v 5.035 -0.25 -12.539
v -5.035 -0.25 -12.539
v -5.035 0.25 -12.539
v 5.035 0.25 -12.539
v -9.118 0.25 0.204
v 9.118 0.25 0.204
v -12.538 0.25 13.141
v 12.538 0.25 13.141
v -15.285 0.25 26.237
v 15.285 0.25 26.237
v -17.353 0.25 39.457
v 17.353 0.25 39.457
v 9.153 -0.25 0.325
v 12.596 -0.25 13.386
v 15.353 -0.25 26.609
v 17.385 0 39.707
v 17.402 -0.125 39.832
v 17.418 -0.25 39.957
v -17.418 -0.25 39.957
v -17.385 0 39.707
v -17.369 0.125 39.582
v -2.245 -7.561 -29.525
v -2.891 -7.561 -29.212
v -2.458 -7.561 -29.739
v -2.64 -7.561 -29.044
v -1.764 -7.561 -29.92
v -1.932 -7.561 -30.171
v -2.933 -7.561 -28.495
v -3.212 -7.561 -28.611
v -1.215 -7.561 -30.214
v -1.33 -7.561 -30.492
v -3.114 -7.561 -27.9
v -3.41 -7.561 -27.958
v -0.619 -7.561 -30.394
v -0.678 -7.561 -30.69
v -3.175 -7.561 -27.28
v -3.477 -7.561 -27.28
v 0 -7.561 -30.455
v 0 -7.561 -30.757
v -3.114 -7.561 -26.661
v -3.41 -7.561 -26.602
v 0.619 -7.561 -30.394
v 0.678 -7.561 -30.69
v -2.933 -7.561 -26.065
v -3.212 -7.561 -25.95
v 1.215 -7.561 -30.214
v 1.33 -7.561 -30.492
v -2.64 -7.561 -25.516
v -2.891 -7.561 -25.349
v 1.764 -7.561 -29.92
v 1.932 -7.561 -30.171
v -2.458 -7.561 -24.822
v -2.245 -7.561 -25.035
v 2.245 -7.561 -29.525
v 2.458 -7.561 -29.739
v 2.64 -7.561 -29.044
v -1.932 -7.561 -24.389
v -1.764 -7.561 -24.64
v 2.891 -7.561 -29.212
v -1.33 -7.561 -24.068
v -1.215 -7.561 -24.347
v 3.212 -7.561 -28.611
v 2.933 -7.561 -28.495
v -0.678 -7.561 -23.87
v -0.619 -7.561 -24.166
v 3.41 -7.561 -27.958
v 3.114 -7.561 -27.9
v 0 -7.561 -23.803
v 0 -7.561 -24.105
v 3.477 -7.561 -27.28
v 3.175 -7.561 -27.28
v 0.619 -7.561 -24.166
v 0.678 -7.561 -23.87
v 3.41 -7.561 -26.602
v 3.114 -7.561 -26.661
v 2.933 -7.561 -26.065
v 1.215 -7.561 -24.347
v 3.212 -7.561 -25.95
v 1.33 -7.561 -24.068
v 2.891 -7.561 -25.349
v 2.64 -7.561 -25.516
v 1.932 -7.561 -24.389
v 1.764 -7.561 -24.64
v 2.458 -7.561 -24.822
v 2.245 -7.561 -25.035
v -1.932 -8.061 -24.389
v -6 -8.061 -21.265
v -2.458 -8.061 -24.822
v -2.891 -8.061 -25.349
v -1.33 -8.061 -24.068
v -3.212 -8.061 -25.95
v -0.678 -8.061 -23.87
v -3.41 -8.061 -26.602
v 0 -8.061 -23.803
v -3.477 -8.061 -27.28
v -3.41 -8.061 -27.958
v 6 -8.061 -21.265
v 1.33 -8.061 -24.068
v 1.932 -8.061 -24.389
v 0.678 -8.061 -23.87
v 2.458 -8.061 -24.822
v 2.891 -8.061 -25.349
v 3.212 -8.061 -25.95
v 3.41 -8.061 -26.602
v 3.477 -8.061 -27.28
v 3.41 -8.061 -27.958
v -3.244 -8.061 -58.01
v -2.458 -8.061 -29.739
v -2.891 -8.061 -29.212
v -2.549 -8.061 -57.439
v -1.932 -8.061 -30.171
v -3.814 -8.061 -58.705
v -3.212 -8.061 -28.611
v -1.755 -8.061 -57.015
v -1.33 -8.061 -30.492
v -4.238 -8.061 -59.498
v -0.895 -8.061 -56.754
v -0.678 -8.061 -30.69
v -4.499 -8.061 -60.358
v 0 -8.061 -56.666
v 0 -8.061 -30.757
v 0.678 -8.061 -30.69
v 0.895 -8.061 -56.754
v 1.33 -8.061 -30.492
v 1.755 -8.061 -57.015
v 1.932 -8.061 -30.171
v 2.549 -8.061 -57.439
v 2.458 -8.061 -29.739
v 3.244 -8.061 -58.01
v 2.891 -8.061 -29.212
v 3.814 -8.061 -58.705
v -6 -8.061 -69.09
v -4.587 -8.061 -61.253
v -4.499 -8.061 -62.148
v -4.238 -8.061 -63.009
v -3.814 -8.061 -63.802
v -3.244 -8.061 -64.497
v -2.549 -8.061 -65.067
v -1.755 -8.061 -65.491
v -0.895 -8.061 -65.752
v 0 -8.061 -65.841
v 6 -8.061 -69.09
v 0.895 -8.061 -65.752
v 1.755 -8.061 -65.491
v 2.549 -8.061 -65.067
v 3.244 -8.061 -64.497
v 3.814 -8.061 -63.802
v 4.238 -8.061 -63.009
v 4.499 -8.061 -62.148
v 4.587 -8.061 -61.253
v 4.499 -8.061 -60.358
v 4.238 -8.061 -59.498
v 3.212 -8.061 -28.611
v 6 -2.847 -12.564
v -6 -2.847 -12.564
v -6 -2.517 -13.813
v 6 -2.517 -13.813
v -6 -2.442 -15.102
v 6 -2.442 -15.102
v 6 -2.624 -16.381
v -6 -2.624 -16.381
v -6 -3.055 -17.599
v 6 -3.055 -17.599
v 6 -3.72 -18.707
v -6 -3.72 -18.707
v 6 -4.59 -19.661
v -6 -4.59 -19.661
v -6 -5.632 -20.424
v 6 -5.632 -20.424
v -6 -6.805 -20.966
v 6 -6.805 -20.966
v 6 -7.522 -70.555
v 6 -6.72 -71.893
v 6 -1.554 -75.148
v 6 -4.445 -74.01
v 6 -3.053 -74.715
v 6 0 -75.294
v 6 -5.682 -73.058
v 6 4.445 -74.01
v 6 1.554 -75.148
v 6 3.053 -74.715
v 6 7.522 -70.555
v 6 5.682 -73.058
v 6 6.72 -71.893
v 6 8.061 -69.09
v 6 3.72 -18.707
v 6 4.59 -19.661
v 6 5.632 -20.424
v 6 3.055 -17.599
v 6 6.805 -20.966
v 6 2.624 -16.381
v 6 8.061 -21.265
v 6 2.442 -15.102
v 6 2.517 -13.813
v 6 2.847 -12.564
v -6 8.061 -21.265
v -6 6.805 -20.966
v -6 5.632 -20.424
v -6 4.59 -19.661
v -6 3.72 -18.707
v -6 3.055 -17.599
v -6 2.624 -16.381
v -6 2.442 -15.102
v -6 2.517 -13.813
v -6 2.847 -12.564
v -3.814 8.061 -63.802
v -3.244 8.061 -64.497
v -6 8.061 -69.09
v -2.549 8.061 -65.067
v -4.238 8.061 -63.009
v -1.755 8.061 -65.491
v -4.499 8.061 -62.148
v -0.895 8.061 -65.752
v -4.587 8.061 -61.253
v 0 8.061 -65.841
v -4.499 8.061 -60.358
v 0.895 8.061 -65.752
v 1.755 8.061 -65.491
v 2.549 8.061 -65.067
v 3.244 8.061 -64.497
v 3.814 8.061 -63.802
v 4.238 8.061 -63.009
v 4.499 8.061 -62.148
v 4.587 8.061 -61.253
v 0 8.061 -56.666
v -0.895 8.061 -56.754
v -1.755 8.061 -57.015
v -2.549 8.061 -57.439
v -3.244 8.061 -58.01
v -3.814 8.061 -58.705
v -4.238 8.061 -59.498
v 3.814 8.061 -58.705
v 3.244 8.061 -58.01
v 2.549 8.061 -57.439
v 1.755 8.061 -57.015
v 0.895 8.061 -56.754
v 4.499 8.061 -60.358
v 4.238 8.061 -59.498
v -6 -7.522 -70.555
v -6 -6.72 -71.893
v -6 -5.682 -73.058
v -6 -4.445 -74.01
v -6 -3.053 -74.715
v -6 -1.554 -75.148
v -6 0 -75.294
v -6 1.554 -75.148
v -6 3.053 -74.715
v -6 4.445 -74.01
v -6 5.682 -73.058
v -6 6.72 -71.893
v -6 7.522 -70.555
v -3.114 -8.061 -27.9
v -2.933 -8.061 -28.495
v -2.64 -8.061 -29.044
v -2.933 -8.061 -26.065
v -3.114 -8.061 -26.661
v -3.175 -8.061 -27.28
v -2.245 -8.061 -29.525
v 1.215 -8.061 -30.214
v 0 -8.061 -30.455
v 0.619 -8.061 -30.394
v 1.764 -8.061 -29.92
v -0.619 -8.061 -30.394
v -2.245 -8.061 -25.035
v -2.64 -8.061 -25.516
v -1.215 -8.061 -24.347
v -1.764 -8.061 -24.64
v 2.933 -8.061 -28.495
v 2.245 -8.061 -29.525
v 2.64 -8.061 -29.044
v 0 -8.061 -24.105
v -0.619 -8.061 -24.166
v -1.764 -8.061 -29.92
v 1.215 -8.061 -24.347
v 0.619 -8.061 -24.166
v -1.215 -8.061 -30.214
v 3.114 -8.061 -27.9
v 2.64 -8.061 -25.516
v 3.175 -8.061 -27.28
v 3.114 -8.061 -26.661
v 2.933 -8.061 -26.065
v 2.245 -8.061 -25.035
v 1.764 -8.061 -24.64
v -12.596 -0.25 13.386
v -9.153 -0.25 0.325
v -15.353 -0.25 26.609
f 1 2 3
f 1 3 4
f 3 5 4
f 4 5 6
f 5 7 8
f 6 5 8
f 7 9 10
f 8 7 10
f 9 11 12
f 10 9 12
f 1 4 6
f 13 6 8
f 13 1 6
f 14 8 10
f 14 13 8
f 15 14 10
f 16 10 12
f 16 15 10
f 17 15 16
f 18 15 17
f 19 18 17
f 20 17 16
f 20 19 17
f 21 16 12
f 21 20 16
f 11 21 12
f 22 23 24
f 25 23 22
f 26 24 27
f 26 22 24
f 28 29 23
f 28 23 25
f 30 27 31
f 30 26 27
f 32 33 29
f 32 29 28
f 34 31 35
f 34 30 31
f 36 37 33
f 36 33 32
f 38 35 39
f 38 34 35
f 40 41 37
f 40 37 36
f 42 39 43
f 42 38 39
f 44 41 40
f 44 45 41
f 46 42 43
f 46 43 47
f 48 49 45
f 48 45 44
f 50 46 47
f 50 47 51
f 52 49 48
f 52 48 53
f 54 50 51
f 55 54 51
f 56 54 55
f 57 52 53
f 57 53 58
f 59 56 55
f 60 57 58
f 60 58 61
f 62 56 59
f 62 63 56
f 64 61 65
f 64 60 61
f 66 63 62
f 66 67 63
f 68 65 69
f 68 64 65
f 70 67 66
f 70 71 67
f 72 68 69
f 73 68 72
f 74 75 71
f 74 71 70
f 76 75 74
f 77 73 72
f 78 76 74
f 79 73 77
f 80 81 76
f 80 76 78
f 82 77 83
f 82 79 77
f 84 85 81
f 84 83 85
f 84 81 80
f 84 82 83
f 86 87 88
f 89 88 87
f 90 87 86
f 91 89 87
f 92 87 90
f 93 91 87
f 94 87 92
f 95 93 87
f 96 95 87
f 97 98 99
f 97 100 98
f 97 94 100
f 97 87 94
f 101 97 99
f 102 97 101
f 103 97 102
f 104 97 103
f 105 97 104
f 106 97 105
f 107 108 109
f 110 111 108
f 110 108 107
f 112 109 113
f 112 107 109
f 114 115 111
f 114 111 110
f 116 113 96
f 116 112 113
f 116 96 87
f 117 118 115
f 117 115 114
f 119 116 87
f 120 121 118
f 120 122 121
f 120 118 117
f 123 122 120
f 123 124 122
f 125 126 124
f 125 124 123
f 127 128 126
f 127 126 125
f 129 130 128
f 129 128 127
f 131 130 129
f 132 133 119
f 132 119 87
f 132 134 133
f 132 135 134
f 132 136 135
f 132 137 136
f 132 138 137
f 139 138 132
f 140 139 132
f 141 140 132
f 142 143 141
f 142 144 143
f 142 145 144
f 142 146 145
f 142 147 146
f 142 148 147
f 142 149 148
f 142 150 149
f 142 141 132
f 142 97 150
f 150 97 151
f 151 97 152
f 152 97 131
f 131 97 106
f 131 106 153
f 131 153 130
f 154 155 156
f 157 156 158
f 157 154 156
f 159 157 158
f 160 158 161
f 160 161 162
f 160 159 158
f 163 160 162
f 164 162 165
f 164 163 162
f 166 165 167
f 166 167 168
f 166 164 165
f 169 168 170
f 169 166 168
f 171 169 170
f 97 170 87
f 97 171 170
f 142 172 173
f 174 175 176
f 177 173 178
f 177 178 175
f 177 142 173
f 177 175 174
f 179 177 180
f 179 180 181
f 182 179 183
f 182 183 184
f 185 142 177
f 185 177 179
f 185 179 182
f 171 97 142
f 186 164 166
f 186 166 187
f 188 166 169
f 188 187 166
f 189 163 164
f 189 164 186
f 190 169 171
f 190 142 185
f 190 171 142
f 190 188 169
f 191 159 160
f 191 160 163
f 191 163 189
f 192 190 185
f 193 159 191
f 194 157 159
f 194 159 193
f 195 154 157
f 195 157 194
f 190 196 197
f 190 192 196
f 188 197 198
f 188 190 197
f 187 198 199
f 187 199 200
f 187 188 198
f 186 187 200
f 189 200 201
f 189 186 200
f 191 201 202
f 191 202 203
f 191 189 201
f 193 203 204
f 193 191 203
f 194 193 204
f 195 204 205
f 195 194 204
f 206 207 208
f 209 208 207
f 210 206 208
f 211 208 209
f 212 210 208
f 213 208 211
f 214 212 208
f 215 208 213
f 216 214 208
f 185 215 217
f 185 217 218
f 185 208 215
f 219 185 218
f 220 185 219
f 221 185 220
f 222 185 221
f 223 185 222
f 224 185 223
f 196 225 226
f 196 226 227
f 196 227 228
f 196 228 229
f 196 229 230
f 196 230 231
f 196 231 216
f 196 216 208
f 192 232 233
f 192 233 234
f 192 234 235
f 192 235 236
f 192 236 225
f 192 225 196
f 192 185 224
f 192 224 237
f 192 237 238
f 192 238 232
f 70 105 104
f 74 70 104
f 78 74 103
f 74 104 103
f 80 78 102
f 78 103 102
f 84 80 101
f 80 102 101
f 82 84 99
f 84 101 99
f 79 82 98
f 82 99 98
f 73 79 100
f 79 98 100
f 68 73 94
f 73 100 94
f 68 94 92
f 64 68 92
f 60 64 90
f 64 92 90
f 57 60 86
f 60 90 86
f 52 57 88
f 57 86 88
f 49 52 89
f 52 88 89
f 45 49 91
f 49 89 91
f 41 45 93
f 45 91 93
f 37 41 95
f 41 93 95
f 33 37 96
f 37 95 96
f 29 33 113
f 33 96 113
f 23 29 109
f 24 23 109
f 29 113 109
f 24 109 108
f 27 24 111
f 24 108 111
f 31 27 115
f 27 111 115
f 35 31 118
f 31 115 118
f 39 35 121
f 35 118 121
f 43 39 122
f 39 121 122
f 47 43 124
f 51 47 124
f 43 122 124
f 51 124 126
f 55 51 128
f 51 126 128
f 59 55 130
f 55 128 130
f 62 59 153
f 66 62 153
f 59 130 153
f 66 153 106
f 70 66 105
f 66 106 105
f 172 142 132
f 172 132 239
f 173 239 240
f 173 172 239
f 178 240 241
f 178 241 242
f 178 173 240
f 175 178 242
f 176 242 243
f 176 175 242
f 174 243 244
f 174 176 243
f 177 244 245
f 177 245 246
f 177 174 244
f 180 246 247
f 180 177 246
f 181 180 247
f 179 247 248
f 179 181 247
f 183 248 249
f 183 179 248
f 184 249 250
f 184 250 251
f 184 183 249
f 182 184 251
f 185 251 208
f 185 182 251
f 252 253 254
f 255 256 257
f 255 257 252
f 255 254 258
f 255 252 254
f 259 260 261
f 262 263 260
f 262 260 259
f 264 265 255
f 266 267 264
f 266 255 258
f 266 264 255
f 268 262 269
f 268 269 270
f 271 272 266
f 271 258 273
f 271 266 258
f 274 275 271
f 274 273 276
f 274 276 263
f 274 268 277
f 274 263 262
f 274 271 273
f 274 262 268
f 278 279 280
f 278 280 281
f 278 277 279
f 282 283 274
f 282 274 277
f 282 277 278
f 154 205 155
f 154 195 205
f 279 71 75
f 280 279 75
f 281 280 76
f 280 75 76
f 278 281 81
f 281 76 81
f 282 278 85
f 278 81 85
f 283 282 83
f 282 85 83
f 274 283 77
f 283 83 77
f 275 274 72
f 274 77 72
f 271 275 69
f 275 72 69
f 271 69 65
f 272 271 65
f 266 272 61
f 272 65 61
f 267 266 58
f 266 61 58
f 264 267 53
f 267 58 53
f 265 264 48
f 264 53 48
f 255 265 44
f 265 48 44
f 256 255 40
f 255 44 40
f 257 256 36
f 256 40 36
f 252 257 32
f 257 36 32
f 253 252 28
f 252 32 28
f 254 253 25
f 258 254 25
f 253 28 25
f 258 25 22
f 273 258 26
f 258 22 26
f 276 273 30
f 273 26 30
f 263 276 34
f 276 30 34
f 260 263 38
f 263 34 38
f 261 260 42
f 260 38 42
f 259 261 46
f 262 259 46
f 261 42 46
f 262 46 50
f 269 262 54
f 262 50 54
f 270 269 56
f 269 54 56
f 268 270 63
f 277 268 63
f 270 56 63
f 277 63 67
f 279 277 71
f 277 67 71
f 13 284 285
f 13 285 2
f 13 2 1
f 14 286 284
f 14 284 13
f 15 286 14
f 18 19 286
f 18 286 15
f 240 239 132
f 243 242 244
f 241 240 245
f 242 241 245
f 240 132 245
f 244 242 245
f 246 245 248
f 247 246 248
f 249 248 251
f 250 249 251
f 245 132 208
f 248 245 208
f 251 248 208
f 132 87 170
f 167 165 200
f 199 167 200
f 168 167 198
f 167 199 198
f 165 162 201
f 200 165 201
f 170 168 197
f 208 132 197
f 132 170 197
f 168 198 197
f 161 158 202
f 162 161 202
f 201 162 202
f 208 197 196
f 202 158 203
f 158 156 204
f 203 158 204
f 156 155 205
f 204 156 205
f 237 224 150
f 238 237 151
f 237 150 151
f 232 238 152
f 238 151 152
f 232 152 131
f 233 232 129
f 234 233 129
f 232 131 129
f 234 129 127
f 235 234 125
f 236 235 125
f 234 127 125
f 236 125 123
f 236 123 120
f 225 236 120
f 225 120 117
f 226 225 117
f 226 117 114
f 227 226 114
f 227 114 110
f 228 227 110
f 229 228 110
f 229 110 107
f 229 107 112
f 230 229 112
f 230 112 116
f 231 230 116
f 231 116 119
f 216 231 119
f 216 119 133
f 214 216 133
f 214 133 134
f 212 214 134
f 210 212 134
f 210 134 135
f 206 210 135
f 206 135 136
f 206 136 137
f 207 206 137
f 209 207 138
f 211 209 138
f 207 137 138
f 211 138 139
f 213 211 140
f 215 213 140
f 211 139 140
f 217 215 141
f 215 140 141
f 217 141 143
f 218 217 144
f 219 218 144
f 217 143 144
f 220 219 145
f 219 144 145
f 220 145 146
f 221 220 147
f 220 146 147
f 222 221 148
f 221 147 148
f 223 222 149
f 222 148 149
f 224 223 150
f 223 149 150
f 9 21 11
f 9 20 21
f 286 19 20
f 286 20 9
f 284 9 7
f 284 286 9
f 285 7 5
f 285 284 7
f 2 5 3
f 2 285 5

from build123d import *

# Parameters (mm, degrees)
F1_DEPTH    = 0.25
F3_DEPTH    = 6
F4_R        = 4.587200225
F5_DEPTH    = 17
F6_T1_DEPTH = 61.6245528892
F7_R        = 3.4767492544
F8_DEPTH    = 0.5
F9_R        = 3.1750599708
F10_DEPTH   = 0.5
F11_DEPTH   = 0.5


# Not quite as in the source:
# - a fillet or chamfer that OpenCascade refuses, or shapes differently, is made with other operations: its cross-section is extruded or revolved along the edge and cut away or added


with BuildPart() as f1:
    # F0 (on Front) → F1 (new body, symmetric)
    with BuildSketch(Plane.XZ):
        with BuildLine():
            Line((0, 44.4571785629), (-17.9538615048, 44.4571785629))
            ThreePointArc((-17.9538615048, 44.4571785629), (-13.1065795403, 15.5935304797), (-5.0346800126, -12.53920421))
            Line((-5.0346800126, -12.53920421), (0, -12.53920421))
            Line((0, -12.53920421), (0, 44.4571785629))
        make_face()
        with BuildLine():
            Line((17.9538615048, 44.4571785629), (0, 44.4571785629))
            Line((0, 44.4571785629), (0, -12.53920421))
            Line((0, -12.53920421), (5.0346800126, -12.53920421))
            ThreePointArc((5.0346800126, -12.53920421), (13.1065795403, 15.5935304797), (17.9538615048, 44.4571785629))
        make_face()
    extrude(amount=F1_DEPTH, both=True)

    # F6: chamfer of 5 on 1 edges, made by hand

    # F6_s2 → F6_t1 (cut)
    with BuildSketch(Plane.YZ.offset(-30.8122764446)):
        Polygon((-4.75, 44.4571785629), (0.25, 39.4571785629), (0.25, 44.4571785629), align=None)
    extrude(amount=F6_T1_DEPTH, mode=Mode.SUBTRACT)


with BuildPart() as f3:
    # F2 (on Right) → F3 (new body, symmetric)
    with BuildSketch(Plane.YZ):
        with BuildLine():
            Line((0, -12.5635201111), (-2.8466044459, -12.5635201111))
            ThreePointArc((-2.8466044459, -12.5635201111), (-3.3598513481, -18.1692156195), (-8.0613978207, -21.2648101151))
            Line((-8.0613978207, -21.2648101151), (-8.0613978207, -69.0904781222))
            ThreePointArc((-8.0613978207, -69.0904781222), (0, -75.2935267917), (8.0613978207, -69.0904781222))
            Line((8.0613978207, -69.0904781222), (8.0613978207, -21.2648101151))
            ThreePointArc((8.0613978207, -21.2648101151), (3.3598513481, -18.1692156195), (2.8466044459, -12.5635201111))
            Line((2.8466044459, -12.5635201111), (0, -12.5635201111))
        make_face()
    extrude(amount=F3_DEPTH, both=True)

    # F4 (on face) → F5 (cut)
    with BuildSketch(Plane.XZ.offset(8.0613978207)):
        with Locations((0, -61.2533651292)):
            Circle(F4_R)
    extrude(amount=-F5_DEPTH, mode=Mode.SUBTRACT)

    # F7 (on face) → F8 (cut)
    with BuildSketch(Plane.XZ.offset(8.0613978207)):
        with Locations((0, -27.280209586)):
            Circle(F7_R)
    extrude(amount=-F8_DEPTH, mode=Mode.SUBTRACT)

    # F9 (on face) → F10 (join)
    with BuildSketch(Plane.XZ.offset(7.5613978207)):
        with Locations((0, -27.280209586)):
            Circle(F9_R)
    extrude(amount=F10_DEPTH)

    # F9 (on face) → F11 (join)
    with BuildSketch(Plane.XZ.offset(7.5613978207)):
        with Locations((0, -27.280209586)):
            Circle(F9_R)
    extrude(amount=F11_DEPTH)


solid = Compound([f1.part, f3.part])
